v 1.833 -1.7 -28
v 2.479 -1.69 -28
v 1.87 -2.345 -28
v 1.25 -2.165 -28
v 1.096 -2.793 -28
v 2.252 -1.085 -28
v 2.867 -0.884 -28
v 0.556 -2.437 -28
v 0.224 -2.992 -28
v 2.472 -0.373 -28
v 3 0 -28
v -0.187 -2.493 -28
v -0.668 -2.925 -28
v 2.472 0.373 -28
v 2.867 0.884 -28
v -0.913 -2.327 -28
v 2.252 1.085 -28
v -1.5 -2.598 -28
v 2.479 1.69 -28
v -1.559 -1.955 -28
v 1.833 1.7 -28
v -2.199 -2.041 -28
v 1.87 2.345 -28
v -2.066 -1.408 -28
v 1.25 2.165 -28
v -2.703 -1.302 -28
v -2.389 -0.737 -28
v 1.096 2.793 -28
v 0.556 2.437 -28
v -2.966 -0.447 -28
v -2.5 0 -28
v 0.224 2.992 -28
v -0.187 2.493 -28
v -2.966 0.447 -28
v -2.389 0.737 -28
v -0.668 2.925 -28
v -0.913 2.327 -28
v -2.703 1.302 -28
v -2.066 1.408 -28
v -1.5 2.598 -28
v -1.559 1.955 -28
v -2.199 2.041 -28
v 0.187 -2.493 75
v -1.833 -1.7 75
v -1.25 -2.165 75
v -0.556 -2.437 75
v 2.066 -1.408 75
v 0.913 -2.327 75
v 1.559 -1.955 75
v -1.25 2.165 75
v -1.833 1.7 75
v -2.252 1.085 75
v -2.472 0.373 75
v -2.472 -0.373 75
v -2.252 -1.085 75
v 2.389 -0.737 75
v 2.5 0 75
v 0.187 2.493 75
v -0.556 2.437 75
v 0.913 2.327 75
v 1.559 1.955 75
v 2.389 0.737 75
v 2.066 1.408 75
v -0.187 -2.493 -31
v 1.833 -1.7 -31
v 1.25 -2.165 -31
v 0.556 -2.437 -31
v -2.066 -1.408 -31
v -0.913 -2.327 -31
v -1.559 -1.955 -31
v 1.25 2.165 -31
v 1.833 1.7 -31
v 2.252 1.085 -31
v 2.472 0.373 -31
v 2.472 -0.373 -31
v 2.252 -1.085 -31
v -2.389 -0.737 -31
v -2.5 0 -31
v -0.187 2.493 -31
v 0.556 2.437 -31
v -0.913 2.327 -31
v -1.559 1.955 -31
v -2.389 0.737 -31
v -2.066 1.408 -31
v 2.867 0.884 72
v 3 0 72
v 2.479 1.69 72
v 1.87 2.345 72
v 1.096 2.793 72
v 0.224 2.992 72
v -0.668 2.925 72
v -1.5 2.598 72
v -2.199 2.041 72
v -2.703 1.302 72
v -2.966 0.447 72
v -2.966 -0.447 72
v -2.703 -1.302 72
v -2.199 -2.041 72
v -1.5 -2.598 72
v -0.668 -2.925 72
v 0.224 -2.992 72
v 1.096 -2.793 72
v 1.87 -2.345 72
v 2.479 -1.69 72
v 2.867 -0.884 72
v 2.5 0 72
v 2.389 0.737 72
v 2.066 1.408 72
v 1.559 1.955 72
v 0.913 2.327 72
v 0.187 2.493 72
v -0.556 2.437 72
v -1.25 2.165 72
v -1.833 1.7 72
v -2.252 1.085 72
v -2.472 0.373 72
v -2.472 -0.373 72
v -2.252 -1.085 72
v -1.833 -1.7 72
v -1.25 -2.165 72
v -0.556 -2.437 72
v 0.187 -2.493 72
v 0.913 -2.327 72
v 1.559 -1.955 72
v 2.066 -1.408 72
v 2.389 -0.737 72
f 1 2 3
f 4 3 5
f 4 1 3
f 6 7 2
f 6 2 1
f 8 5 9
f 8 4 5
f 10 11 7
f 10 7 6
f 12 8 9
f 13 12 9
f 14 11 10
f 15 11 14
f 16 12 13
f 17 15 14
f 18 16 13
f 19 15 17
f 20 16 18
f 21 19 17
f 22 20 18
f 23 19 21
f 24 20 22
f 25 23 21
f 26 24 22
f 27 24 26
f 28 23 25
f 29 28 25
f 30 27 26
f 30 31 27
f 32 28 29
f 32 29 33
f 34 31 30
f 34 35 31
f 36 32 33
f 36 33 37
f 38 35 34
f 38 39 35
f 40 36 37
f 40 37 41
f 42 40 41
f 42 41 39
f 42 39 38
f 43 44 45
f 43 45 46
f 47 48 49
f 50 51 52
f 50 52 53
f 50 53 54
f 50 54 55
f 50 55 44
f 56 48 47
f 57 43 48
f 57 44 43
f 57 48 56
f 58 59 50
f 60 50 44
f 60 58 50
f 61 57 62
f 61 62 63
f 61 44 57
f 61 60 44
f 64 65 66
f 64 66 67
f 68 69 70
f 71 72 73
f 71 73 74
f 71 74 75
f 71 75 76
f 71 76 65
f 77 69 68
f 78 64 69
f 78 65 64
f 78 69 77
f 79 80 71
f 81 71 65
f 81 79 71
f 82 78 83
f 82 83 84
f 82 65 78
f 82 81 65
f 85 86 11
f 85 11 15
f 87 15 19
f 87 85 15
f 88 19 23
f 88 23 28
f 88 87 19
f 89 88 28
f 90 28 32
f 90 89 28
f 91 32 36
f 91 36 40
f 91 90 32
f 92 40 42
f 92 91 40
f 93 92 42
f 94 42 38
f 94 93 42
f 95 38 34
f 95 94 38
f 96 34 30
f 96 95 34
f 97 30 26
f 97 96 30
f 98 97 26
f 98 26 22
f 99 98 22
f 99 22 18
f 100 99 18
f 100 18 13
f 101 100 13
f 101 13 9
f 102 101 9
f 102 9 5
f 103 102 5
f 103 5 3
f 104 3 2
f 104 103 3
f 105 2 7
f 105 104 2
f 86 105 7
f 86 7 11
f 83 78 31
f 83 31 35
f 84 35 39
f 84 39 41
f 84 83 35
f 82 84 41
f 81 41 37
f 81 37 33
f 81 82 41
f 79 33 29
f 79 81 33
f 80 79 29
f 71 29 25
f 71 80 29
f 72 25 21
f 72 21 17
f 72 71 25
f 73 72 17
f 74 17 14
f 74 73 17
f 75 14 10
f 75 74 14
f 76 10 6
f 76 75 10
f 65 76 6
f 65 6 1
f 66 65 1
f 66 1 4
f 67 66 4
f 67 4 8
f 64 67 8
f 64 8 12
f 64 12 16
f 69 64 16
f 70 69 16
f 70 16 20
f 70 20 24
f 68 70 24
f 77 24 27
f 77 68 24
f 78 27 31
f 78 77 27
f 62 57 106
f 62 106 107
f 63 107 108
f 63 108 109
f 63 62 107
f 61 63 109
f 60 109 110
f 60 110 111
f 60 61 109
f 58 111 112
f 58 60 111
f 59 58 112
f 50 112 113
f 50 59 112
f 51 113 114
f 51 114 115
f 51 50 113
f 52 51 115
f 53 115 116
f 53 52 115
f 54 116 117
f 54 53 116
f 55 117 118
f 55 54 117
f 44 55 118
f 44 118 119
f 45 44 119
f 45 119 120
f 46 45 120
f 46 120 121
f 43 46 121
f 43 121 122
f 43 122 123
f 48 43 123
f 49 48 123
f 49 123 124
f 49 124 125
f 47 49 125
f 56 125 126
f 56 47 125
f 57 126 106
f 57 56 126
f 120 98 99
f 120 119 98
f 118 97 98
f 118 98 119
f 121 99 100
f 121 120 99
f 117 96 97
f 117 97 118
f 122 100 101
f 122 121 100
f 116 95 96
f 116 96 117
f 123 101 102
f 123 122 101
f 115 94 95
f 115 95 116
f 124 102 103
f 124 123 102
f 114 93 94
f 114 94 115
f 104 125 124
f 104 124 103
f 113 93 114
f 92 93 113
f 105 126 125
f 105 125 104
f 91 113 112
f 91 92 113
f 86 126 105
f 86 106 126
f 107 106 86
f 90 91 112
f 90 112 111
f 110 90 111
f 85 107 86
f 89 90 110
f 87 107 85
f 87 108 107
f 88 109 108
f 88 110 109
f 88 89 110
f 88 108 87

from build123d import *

# Parameters (mm, degrees)
SKETCH2_R                = 3
BOSS_EXTRUDE1_DEPTH      = 75
BOSS_EXTRUDE1_DEPTH_BACK = 75
CHAMFER1_SIZE            = 0.12
SKETCH4_R                = 3
CUT_EXTRUDE1_DEPTH       = 44
SKETCH5_OUTSIDE_W        = 29.268
SKETCH5_OUTSIDE_H        = 29.268
SKETCH5_OUTSIDE_R        = 2.5
CUT_EXTRUDE2_DEPTH       = 3
SKETCH6_OUTSIDE_W        = 29.268
SKETCH6_OUTSIDE_H        = 29.268
SKETCH6_OUTSIDE_R        = 2.5
CUT_EXTRUDE3_DEPTH       = 3


with BuildPart() as part:
    # Sketch2 → Boss-Extrude1 (new body, two sides)
    with BuildSketch(Plane.XY) as boss_extrude1_sk:
        Circle(SKETCH2_R)
    extrude(amount=BOSS_EXTRUDE1_DEPTH)
    extrude(boss_extrude1_sk.sketch, amount=-BOSS_EXTRUDE1_DEPTH_BACK)

    # Chamfer1
    chamfer1_edges = [part.edges().sort_by_distance(p)[0] for p in [
        (-3, 0, -75),
        (-3, 0, 75),
    ]]
    chamfer(chamfer1_edges, length=CHAMFER1_SIZE)

    # Sketch4 → Cut-Extrude1 (cut)
    with BuildSketch(Plane(origin=(0, 0, -75), x_dir=(-1, 0, 0), z_dir=(0, 0, -1))):
        Circle(SKETCH4_R)
    extrude(amount=-CUT_EXTRUDE1_DEPTH, mode=Mode.SUBTRACT)

    # Sketch5 outside → Cut-Extrude2 (cut)
    with BuildSketch(Plane(origin=(0, 0, -31), x_dir=(-1, 0, 0), z_dir=(0, 0, -1))):
        Rectangle(SKETCH5_OUTSIDE_W, SKETCH5_OUTSIDE_H)
        Circle(SKETCH5_OUTSIDE_R, mode=Mode.SUBTRACT)
    extrude(amount=-CUT_EXTRUDE2_DEPTH, mode=Mode.SUBTRACT)

    # Sketch6 outside → Cut-Extrude3 (cut)
    with BuildSketch(Plane.XY.offset(75)):
        Rectangle(SKETCH6_OUTSIDE_W, SKETCH6_OUTSIDE_H)
        Circle(SKETCH6_OUTSIDE_R, mode=Mode.SUBTRACT)
    extrude(amount=-CUT_EXTRUDE3_DEPTH, mode=Mode.SUBTRACT)


solid = part.part
